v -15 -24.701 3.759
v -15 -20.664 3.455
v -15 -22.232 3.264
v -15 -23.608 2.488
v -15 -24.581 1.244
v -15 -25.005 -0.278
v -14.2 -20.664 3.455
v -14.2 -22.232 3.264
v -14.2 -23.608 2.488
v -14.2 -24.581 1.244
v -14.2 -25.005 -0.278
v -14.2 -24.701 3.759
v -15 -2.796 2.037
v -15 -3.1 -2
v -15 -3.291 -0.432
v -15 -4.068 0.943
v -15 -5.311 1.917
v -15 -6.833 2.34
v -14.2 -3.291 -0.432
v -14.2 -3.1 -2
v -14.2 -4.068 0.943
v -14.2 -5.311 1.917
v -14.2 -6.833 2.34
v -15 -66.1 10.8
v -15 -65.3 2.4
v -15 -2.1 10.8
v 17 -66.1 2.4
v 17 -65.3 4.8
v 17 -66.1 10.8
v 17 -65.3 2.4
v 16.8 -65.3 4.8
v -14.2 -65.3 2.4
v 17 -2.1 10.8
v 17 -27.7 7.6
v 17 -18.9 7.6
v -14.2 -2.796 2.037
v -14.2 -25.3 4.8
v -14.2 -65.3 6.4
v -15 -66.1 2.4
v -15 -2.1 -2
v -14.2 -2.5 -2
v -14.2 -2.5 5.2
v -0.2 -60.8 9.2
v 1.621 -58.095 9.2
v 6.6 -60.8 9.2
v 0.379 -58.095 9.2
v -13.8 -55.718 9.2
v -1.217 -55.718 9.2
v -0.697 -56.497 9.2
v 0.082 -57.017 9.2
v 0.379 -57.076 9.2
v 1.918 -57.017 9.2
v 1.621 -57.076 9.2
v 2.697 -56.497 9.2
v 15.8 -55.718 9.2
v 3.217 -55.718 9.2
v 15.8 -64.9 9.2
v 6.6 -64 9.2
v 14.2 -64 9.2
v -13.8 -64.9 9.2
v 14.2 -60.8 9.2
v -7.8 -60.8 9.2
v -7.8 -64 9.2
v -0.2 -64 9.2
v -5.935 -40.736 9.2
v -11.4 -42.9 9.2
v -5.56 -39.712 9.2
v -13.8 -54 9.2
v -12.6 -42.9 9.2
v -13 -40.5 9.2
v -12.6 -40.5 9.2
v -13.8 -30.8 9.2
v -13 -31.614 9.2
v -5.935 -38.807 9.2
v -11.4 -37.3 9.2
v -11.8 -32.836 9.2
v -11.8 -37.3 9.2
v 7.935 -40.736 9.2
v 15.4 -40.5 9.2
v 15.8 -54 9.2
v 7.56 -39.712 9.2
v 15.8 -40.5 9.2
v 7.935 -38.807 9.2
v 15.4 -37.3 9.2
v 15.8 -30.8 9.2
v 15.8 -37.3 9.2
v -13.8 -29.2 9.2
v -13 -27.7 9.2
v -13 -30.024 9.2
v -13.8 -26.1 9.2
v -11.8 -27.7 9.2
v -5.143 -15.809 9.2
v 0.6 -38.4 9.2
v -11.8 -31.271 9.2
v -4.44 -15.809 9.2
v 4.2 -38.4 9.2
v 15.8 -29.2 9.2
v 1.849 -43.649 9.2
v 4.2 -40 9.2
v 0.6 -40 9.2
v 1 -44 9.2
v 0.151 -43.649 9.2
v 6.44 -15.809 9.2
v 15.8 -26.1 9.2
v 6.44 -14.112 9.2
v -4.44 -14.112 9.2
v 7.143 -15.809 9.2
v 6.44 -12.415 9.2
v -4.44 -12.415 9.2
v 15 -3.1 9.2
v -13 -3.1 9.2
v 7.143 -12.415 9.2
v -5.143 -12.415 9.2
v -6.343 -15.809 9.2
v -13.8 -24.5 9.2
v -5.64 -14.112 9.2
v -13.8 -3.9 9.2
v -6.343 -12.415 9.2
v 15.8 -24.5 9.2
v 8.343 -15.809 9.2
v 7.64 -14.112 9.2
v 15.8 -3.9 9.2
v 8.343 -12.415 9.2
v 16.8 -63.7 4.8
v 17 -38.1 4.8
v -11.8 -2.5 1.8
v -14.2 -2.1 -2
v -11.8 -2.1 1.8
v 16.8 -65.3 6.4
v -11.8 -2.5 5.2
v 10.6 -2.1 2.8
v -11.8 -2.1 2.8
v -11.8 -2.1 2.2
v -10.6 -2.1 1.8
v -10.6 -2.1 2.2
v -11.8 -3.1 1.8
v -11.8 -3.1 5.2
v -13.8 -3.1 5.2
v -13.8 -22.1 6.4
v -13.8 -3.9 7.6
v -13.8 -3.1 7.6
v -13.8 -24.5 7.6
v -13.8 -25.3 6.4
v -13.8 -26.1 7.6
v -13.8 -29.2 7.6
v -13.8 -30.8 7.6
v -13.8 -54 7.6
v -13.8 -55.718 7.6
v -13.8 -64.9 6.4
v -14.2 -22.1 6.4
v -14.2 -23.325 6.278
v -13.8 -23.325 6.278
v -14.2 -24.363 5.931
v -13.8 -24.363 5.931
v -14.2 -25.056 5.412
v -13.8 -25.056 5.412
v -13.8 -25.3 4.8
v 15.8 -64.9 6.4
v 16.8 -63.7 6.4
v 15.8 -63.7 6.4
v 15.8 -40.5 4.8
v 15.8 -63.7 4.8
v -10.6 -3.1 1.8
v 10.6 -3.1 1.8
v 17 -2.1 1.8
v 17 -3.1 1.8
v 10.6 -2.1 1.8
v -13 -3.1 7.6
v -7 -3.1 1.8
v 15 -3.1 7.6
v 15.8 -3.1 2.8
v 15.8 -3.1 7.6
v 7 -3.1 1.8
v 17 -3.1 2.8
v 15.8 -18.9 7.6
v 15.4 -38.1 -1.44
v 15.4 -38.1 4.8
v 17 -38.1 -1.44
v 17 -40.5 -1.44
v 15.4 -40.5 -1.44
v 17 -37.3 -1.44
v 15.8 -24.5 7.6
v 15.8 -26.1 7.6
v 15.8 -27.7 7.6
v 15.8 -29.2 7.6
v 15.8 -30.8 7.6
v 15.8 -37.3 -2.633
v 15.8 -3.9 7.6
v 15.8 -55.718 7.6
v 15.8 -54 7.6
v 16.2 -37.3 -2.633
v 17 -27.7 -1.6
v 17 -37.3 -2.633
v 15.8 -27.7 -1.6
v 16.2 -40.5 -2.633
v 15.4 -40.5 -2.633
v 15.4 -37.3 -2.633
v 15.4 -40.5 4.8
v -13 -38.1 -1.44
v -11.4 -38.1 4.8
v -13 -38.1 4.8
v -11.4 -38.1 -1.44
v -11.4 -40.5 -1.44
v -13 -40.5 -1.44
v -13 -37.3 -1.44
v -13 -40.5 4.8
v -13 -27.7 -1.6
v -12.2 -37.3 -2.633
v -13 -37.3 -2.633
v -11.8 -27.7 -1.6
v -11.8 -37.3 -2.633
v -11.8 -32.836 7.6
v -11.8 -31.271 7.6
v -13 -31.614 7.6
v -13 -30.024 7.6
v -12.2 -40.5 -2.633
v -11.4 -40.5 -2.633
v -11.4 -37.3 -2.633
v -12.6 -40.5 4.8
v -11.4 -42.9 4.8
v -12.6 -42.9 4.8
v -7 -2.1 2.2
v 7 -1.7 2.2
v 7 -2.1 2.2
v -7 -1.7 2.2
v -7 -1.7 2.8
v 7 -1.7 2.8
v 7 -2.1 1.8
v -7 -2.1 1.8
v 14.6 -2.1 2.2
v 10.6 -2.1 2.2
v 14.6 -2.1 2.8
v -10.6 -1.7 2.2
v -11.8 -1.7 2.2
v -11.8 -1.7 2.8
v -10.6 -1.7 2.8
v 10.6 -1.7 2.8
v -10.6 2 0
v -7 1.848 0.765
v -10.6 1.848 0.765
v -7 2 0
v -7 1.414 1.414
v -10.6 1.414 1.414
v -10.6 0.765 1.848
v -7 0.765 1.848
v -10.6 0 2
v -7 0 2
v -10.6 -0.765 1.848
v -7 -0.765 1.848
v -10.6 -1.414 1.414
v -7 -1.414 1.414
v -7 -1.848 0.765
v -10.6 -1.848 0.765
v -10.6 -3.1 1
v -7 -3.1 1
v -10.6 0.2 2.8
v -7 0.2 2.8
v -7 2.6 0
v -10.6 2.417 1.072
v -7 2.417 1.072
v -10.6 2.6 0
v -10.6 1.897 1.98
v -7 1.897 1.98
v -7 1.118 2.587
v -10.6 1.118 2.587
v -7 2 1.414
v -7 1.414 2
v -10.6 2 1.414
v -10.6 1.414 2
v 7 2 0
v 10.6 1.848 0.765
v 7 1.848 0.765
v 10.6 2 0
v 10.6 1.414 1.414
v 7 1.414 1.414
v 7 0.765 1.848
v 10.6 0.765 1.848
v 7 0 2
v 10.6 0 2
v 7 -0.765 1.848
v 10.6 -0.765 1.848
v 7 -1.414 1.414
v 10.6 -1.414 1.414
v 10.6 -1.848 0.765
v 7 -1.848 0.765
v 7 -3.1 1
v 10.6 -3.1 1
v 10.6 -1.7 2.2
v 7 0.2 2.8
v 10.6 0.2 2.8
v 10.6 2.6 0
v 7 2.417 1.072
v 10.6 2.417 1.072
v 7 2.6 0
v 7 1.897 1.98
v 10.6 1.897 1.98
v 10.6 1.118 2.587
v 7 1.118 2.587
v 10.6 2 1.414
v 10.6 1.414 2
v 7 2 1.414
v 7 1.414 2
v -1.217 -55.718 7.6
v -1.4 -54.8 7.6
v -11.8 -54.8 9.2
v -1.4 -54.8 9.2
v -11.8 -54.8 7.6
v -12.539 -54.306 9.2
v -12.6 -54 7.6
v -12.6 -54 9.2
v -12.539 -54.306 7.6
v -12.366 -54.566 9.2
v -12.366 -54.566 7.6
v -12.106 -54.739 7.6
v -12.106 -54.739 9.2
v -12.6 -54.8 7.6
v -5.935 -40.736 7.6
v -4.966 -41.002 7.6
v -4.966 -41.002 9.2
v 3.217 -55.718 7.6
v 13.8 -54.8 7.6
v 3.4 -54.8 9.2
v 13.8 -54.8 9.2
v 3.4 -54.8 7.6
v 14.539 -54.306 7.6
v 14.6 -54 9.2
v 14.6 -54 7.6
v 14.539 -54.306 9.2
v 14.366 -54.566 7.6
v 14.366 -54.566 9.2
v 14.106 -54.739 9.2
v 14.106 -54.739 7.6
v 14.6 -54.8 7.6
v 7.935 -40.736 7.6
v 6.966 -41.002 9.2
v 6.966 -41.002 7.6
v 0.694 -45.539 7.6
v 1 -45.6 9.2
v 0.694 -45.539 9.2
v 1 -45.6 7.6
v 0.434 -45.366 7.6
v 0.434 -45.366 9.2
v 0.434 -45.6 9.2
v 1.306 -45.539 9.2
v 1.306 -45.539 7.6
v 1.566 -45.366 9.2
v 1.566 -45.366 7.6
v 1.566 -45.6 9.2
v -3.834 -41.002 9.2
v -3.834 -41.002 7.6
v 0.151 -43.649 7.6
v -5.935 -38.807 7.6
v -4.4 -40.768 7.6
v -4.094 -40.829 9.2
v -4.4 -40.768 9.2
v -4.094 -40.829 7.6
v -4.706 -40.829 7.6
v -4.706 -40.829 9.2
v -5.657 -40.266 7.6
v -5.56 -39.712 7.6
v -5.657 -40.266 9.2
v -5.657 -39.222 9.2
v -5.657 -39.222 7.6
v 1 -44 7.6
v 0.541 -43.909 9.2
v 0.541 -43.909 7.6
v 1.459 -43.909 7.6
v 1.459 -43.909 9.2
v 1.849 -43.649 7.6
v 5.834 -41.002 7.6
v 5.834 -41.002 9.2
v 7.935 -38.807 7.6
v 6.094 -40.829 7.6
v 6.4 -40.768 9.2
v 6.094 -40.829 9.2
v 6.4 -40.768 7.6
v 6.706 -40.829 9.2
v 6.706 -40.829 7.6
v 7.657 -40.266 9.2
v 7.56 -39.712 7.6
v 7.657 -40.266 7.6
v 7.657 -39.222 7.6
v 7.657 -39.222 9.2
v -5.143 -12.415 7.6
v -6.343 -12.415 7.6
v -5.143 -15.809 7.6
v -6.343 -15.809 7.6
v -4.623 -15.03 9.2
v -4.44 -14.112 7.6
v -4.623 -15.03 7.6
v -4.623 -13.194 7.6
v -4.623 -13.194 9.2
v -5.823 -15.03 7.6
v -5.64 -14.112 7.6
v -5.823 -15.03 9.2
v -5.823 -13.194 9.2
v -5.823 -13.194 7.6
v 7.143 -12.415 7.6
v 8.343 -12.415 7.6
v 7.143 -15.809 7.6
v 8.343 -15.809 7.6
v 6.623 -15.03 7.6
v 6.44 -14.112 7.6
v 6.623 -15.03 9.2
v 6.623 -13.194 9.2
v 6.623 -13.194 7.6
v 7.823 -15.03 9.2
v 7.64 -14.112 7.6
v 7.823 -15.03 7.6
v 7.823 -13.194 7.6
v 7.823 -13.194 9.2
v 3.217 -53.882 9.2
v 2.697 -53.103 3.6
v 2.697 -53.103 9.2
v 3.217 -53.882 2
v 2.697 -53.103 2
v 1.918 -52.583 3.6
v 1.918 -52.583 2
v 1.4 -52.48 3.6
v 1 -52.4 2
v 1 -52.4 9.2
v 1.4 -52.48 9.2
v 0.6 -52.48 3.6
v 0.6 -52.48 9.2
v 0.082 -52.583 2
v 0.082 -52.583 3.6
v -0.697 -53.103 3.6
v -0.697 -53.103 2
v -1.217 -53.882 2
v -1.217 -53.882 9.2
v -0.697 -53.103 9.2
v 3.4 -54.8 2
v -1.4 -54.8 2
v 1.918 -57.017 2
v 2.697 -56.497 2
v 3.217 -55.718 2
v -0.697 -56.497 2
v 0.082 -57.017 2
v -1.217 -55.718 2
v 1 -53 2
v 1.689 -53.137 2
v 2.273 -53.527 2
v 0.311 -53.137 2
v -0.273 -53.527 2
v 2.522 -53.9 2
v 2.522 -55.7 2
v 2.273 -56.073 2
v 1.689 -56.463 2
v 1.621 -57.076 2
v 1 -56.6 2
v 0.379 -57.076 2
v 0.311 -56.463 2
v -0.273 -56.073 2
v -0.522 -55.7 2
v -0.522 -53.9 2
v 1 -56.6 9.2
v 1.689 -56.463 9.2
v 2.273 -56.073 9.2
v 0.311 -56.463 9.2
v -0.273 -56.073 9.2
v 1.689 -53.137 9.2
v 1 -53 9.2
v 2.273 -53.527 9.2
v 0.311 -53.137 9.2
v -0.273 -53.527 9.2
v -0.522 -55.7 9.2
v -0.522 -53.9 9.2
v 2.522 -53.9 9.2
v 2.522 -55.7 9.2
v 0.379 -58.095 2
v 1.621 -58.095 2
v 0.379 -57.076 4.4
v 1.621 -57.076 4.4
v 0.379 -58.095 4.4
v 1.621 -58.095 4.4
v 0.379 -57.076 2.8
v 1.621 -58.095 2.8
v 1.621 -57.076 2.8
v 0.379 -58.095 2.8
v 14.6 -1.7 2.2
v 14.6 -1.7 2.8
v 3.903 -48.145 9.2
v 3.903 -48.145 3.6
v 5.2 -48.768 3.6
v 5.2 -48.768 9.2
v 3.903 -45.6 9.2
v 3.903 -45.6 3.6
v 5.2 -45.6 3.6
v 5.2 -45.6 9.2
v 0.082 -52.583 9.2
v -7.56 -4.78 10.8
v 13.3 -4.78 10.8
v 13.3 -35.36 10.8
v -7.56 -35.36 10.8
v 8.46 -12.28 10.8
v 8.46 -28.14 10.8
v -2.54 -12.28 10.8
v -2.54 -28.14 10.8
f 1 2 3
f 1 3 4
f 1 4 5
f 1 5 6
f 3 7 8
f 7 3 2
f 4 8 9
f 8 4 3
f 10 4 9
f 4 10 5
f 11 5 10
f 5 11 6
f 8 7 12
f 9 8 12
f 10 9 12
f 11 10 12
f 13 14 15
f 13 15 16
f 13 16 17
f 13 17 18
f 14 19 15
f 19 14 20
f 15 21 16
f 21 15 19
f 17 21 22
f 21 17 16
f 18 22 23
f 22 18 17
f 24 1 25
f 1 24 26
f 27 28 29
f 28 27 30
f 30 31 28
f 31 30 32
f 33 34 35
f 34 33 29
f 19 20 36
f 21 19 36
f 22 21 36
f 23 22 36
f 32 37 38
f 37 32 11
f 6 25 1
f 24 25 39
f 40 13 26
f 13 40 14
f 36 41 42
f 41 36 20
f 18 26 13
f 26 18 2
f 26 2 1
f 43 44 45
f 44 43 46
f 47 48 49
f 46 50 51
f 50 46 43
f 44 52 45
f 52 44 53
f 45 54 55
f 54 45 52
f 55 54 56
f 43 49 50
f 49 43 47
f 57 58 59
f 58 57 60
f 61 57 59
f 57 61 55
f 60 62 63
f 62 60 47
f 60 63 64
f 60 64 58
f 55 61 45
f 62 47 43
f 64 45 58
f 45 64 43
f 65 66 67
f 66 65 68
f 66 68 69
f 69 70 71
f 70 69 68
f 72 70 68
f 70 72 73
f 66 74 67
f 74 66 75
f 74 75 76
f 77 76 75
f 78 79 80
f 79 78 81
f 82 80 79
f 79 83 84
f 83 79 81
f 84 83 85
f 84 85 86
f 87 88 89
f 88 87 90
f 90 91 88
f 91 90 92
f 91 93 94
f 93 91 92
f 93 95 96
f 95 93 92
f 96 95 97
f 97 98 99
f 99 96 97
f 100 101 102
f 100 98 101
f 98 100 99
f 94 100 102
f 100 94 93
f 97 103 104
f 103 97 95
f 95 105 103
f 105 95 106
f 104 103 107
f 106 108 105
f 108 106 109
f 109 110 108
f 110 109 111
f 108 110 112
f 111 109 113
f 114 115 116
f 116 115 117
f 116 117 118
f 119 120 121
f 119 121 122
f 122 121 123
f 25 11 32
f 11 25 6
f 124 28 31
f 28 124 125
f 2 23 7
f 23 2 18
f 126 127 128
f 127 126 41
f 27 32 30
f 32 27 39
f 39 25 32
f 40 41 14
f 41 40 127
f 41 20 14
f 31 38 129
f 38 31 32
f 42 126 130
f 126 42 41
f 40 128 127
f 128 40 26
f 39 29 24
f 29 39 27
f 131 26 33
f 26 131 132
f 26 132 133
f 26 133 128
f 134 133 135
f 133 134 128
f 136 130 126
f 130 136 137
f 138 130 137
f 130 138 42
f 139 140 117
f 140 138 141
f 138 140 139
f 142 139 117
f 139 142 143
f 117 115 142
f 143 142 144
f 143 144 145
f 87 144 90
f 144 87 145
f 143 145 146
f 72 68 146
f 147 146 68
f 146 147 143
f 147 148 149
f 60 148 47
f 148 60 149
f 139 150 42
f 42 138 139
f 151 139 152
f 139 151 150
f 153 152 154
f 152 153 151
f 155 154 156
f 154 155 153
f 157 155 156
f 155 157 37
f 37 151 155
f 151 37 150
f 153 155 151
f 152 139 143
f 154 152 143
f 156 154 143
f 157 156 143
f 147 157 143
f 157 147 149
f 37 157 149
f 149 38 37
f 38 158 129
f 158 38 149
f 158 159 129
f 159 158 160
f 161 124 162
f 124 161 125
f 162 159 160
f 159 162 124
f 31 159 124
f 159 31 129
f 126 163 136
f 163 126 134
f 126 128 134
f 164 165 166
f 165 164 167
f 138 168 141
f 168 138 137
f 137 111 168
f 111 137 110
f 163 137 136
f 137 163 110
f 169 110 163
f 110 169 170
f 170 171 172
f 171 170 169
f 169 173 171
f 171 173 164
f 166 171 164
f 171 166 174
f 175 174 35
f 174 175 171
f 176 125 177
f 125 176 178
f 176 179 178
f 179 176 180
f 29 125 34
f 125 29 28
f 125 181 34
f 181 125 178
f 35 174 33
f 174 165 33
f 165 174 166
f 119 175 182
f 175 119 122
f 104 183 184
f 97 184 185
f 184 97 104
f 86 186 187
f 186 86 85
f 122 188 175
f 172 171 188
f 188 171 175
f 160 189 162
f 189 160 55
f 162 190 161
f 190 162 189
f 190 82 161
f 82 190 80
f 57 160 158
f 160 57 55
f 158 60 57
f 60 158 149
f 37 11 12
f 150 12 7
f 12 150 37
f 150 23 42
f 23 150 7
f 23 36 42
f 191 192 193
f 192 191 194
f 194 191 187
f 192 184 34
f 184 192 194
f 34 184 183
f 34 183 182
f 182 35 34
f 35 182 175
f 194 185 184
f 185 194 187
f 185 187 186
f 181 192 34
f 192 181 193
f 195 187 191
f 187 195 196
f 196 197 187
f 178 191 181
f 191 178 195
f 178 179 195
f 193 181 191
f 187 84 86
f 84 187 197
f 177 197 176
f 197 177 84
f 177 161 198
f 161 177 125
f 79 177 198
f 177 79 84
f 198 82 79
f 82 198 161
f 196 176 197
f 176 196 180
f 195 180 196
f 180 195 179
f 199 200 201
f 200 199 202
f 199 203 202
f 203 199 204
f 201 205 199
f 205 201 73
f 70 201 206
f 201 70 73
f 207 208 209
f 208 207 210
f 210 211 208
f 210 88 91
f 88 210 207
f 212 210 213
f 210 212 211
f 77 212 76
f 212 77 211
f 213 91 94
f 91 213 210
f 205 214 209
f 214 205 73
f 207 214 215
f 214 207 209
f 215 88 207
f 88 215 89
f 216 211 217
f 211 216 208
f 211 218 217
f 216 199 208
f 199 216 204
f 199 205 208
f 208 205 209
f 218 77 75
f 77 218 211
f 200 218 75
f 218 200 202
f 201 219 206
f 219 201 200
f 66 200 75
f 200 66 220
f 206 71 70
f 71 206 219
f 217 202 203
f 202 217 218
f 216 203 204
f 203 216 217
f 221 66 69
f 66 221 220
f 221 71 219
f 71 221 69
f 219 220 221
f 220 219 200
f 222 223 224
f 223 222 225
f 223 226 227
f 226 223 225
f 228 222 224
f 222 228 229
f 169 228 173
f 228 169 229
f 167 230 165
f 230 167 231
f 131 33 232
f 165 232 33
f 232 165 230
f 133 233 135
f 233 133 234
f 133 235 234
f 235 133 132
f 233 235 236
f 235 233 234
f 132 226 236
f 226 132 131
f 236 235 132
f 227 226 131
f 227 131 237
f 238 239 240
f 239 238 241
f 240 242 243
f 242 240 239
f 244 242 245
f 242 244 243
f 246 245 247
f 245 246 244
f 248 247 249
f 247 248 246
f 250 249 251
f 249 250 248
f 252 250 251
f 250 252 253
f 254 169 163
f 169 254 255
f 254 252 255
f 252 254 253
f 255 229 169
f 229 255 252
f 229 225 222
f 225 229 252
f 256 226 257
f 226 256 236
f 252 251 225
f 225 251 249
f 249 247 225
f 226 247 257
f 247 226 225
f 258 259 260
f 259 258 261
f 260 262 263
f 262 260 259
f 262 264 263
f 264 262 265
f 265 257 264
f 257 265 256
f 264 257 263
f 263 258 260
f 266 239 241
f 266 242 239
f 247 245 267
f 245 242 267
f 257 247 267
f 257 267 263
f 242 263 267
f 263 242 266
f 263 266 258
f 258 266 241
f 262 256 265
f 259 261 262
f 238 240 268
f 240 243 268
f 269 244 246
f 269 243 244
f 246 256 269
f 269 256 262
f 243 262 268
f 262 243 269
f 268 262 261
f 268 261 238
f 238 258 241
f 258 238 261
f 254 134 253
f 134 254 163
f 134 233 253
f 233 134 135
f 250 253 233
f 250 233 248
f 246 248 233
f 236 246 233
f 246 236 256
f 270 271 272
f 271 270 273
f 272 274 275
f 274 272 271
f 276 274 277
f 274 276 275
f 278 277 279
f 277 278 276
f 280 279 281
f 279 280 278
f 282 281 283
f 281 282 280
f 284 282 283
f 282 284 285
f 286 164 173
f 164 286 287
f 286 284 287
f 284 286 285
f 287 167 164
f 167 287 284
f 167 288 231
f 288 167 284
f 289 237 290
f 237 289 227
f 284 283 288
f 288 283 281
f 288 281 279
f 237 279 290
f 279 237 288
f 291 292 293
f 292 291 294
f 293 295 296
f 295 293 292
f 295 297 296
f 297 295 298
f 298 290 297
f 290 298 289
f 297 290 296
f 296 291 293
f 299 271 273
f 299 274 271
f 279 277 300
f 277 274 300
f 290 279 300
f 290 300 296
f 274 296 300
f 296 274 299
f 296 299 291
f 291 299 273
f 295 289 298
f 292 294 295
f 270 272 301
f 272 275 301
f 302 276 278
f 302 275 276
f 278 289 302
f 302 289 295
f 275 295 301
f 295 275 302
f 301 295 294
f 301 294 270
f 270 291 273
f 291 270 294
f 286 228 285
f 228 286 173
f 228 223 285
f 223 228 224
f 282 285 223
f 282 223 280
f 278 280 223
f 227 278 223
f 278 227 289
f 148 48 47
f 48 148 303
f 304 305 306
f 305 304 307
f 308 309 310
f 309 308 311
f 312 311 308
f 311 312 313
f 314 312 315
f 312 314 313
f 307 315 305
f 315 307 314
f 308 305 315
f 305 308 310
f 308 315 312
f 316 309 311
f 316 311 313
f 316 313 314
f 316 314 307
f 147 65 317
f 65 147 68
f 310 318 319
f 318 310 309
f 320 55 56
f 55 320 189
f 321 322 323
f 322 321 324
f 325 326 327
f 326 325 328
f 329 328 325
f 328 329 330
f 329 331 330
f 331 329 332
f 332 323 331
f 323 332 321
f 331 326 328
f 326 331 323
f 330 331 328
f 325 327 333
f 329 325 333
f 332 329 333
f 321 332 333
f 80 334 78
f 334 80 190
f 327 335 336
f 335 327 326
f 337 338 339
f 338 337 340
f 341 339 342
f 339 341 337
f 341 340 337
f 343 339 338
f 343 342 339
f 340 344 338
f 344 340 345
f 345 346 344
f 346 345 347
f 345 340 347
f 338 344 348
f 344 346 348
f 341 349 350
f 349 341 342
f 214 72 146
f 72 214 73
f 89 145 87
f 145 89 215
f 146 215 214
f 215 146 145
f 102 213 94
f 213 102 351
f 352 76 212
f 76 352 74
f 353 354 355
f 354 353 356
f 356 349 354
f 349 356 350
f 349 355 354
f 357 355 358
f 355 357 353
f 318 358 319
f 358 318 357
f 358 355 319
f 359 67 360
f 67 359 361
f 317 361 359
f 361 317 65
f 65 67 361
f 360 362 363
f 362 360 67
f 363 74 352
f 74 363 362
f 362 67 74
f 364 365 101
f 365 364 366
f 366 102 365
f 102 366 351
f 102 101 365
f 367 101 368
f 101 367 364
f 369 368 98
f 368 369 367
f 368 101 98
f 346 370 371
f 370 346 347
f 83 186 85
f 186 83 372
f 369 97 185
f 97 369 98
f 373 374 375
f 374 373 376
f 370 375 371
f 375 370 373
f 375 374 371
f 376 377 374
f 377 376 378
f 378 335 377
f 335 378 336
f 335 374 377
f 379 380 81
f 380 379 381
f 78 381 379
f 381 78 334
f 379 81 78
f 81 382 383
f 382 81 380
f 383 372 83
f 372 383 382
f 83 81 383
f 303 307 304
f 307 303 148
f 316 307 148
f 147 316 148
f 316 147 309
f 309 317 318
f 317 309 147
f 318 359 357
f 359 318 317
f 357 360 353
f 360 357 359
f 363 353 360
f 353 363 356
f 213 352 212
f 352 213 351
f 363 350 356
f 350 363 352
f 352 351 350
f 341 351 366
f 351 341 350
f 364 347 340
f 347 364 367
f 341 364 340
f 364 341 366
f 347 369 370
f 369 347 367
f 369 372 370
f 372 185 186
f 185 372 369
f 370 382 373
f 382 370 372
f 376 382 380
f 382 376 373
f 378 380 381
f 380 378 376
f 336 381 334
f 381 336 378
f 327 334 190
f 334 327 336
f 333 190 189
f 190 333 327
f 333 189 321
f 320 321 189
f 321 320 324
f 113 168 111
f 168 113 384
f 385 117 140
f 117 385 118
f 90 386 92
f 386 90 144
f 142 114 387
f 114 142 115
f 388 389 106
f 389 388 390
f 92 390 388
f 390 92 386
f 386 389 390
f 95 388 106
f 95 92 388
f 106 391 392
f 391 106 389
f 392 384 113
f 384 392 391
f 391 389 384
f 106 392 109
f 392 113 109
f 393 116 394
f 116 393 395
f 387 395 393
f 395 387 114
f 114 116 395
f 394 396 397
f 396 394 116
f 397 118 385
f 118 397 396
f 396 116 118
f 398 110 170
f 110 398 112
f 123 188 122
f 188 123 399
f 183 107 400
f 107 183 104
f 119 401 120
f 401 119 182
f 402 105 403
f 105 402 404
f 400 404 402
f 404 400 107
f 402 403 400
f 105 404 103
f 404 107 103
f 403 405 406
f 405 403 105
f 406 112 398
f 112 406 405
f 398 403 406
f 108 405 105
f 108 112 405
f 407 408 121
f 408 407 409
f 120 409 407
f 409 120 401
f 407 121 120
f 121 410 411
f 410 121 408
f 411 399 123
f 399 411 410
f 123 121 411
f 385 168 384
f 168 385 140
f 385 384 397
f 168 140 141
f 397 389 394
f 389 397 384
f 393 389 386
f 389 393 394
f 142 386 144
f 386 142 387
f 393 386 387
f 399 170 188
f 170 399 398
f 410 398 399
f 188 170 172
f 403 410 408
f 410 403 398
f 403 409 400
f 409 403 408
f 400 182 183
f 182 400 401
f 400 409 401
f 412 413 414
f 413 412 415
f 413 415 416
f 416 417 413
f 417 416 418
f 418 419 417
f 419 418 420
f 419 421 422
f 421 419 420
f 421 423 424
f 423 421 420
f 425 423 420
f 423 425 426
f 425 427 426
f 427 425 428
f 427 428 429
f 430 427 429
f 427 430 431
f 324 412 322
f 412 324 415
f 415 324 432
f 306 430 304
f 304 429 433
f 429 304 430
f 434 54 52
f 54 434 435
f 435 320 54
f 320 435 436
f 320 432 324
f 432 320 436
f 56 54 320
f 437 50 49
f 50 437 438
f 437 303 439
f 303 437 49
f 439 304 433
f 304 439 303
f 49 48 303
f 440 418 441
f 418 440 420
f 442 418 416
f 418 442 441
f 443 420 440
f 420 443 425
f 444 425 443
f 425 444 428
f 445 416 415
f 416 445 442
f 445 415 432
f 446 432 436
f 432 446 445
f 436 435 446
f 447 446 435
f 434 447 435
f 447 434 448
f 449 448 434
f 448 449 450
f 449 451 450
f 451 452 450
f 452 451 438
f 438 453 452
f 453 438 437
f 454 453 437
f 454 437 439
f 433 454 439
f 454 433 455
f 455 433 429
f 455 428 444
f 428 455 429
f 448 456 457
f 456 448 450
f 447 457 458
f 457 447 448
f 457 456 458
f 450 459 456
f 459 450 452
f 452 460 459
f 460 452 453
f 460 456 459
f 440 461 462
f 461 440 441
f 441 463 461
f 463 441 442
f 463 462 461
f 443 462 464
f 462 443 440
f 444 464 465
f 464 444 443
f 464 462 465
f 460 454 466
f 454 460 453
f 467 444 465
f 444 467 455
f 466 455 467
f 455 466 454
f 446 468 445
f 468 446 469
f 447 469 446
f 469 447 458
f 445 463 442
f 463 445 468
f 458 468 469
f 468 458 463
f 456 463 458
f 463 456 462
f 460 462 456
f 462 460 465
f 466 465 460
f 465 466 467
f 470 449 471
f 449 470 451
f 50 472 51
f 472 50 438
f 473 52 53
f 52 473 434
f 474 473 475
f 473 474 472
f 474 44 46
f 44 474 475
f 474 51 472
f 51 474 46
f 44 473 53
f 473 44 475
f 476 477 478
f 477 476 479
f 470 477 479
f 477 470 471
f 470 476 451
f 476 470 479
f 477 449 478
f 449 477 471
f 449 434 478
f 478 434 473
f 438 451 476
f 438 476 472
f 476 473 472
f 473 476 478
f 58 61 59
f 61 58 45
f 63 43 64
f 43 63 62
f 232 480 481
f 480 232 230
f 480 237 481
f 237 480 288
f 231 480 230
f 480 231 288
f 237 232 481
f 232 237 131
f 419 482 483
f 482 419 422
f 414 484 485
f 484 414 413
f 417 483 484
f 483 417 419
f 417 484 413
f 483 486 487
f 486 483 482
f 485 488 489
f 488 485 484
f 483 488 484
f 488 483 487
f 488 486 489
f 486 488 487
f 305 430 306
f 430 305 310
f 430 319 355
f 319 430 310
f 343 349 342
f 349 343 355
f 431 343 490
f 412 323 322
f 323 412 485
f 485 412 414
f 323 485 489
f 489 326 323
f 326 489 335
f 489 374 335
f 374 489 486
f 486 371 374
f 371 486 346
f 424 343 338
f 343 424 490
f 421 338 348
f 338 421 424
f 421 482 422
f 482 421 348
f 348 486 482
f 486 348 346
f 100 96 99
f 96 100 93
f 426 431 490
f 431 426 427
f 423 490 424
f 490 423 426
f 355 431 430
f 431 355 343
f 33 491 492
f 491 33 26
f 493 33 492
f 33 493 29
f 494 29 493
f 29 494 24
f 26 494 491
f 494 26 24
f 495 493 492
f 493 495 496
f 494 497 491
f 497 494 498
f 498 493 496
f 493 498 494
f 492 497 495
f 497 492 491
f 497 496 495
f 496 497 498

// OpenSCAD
use <../lib.scad>
use <s/4112s01.scad>
use <s/4112s03.scad>
function ldraw_lib__4112p01() = [
// 0 ~Electric Switch: Key Left with Point Straight Pattern
// 0 Name: 4112p01.dat
// 0 Author: Javier Orquera [kuramapika1]
// 0 !LDRAW_ORG Part UPDATE 2025-09
// 0 !LICENSE Licensed under CC BY 4.0 : see CAreadme.txt
// 
// 0 !HELP to put this part into a pressed-down state, rotate it 4.3 degrees
// 0 !HELP around the x-axis
// 
// 0 BFC CERTIFY CCW
  [0,"BFC","CERTIFY"],
  [0,"BFC","CCW"],
// 
// 0 !KEYWORDS Set 1239, Set 5080, Set 7858, Set 7859, Set 7863, switch, Train
// 
// 0 !HISTORY 2025-04-24 [kuramapika1] Adapted surfaces
// 0 !HISTORY 2025-09-11 [kuramapika1] Use of new subfile
// 0 !HISTORY 2025-09-29 [OrionP] Official Update 2025-09
// 
// 1 16 0 0 0 1 0 0 0 1 0 0 0 1 s\4112s01.dat
  [1,16,0,0,0,1,0,0,0,1,0,0,0,1, ldraw_lib__s__4112s01()],
// 1 16 0 0 0 1 0 0 0 1 0 0 0 1 s\4112s03.dat
  [1,16,0,0,0,1,0,0,0,1,0,0,0,1, ldraw_lib__s__4112s03()],
// 4 16 -18.9 -27 -11.95 33.25 -27 -11.95 42.5 -27 -5.25 -37.5 -27 -5.25
  [4,16,-18.9,-27,-11.95,33.25,-27,-11.95,42.5,-27,-5.25,-37.5,-27,-5.25],
// 4 16 42.5 -27 -5.25 33.25 -27 -11.95 33.25 -27 -88.4 42.5 -27 -165.25
  [4,16,42.5,-27,-5.25,33.25,-27,-11.95,33.25,-27,-88.4,42.5,-27,-165.25],
// 4 16 -37.5 -27 -165.25 42.5 -27 -165.25 33.25 -27 -88.4 -18.9 -27 -88.4
  [4,16,-37.5,-27,-165.25,42.5,-27,-165.25,33.25,-27,-88.4,-18.9,-27,-88.4],
// 4 16 -18.9 -27 -11.95 -37.5 -27 -5.25 -37.5 -27 -165.25 -18.9 -27 -88.4
  [4,16,-18.9,-27,-11.95,-37.5,-27,-5.25,-37.5,-27,-165.25,-18.9,-27,-88.4],
// 4 0 33.25 -27 -11.95 21.15 -27 -30.7 21.15 -27 -70.35 33.25 -27 -88.4
  [4,0,33.25,-27,-11.95,21.15,-27,-30.7,21.15,-27,-70.35,33.25,-27,-88.4],
// 4 0 -6.35 -27 -30.7 -18.9 -27 -11.95 -18.9 -27 -88.4 -6.35 -27 -70.35
  [4,0,-6.35,-27,-30.7,-18.9,-27,-11.95,-18.9,-27,-88.4,-6.35,-27,-70.35],
// 4 0 21.15 -27 -70.35 -6.35 -27 -70.35 -18.9 -27 -88.4 33.25 -27 -88.4
  [4,0,21.15,-27,-70.35,-6.35,-27,-70.35,-18.9,-27,-88.4,33.25,-27,-88.4],
// 4 0 33.25 -27 -11.95 -18.9 -27 -11.95 -6.35 -27 -30.7 21.15 -27 -30.7
  [4,0,33.25,-27,-11.95,-18.9,-27,-11.95,-6.35,-27,-30.7,21.15,-27,-30.7],
// 4 15 21.15 -27 -30.7 -6.35 -27 -30.7 -6.35 -27 -70.35 21.15 -27 -70.35
  [4,15,21.15,-27,-30.7,-6.35,-27,-30.7,-6.35,-27,-70.35,21.15,-27,-70.35],
];
module ldraw_lib__4112p01(step=0, col=false, unit=2/5, alt=false, line=0.2, solid=!$preview)
    makepoly(ldraw_lib__4112p01(), step=step, col=col, unit=unit, alt=alt, line=line, solid=solid);
ldraw_lib__4112p01(line=0.2);
